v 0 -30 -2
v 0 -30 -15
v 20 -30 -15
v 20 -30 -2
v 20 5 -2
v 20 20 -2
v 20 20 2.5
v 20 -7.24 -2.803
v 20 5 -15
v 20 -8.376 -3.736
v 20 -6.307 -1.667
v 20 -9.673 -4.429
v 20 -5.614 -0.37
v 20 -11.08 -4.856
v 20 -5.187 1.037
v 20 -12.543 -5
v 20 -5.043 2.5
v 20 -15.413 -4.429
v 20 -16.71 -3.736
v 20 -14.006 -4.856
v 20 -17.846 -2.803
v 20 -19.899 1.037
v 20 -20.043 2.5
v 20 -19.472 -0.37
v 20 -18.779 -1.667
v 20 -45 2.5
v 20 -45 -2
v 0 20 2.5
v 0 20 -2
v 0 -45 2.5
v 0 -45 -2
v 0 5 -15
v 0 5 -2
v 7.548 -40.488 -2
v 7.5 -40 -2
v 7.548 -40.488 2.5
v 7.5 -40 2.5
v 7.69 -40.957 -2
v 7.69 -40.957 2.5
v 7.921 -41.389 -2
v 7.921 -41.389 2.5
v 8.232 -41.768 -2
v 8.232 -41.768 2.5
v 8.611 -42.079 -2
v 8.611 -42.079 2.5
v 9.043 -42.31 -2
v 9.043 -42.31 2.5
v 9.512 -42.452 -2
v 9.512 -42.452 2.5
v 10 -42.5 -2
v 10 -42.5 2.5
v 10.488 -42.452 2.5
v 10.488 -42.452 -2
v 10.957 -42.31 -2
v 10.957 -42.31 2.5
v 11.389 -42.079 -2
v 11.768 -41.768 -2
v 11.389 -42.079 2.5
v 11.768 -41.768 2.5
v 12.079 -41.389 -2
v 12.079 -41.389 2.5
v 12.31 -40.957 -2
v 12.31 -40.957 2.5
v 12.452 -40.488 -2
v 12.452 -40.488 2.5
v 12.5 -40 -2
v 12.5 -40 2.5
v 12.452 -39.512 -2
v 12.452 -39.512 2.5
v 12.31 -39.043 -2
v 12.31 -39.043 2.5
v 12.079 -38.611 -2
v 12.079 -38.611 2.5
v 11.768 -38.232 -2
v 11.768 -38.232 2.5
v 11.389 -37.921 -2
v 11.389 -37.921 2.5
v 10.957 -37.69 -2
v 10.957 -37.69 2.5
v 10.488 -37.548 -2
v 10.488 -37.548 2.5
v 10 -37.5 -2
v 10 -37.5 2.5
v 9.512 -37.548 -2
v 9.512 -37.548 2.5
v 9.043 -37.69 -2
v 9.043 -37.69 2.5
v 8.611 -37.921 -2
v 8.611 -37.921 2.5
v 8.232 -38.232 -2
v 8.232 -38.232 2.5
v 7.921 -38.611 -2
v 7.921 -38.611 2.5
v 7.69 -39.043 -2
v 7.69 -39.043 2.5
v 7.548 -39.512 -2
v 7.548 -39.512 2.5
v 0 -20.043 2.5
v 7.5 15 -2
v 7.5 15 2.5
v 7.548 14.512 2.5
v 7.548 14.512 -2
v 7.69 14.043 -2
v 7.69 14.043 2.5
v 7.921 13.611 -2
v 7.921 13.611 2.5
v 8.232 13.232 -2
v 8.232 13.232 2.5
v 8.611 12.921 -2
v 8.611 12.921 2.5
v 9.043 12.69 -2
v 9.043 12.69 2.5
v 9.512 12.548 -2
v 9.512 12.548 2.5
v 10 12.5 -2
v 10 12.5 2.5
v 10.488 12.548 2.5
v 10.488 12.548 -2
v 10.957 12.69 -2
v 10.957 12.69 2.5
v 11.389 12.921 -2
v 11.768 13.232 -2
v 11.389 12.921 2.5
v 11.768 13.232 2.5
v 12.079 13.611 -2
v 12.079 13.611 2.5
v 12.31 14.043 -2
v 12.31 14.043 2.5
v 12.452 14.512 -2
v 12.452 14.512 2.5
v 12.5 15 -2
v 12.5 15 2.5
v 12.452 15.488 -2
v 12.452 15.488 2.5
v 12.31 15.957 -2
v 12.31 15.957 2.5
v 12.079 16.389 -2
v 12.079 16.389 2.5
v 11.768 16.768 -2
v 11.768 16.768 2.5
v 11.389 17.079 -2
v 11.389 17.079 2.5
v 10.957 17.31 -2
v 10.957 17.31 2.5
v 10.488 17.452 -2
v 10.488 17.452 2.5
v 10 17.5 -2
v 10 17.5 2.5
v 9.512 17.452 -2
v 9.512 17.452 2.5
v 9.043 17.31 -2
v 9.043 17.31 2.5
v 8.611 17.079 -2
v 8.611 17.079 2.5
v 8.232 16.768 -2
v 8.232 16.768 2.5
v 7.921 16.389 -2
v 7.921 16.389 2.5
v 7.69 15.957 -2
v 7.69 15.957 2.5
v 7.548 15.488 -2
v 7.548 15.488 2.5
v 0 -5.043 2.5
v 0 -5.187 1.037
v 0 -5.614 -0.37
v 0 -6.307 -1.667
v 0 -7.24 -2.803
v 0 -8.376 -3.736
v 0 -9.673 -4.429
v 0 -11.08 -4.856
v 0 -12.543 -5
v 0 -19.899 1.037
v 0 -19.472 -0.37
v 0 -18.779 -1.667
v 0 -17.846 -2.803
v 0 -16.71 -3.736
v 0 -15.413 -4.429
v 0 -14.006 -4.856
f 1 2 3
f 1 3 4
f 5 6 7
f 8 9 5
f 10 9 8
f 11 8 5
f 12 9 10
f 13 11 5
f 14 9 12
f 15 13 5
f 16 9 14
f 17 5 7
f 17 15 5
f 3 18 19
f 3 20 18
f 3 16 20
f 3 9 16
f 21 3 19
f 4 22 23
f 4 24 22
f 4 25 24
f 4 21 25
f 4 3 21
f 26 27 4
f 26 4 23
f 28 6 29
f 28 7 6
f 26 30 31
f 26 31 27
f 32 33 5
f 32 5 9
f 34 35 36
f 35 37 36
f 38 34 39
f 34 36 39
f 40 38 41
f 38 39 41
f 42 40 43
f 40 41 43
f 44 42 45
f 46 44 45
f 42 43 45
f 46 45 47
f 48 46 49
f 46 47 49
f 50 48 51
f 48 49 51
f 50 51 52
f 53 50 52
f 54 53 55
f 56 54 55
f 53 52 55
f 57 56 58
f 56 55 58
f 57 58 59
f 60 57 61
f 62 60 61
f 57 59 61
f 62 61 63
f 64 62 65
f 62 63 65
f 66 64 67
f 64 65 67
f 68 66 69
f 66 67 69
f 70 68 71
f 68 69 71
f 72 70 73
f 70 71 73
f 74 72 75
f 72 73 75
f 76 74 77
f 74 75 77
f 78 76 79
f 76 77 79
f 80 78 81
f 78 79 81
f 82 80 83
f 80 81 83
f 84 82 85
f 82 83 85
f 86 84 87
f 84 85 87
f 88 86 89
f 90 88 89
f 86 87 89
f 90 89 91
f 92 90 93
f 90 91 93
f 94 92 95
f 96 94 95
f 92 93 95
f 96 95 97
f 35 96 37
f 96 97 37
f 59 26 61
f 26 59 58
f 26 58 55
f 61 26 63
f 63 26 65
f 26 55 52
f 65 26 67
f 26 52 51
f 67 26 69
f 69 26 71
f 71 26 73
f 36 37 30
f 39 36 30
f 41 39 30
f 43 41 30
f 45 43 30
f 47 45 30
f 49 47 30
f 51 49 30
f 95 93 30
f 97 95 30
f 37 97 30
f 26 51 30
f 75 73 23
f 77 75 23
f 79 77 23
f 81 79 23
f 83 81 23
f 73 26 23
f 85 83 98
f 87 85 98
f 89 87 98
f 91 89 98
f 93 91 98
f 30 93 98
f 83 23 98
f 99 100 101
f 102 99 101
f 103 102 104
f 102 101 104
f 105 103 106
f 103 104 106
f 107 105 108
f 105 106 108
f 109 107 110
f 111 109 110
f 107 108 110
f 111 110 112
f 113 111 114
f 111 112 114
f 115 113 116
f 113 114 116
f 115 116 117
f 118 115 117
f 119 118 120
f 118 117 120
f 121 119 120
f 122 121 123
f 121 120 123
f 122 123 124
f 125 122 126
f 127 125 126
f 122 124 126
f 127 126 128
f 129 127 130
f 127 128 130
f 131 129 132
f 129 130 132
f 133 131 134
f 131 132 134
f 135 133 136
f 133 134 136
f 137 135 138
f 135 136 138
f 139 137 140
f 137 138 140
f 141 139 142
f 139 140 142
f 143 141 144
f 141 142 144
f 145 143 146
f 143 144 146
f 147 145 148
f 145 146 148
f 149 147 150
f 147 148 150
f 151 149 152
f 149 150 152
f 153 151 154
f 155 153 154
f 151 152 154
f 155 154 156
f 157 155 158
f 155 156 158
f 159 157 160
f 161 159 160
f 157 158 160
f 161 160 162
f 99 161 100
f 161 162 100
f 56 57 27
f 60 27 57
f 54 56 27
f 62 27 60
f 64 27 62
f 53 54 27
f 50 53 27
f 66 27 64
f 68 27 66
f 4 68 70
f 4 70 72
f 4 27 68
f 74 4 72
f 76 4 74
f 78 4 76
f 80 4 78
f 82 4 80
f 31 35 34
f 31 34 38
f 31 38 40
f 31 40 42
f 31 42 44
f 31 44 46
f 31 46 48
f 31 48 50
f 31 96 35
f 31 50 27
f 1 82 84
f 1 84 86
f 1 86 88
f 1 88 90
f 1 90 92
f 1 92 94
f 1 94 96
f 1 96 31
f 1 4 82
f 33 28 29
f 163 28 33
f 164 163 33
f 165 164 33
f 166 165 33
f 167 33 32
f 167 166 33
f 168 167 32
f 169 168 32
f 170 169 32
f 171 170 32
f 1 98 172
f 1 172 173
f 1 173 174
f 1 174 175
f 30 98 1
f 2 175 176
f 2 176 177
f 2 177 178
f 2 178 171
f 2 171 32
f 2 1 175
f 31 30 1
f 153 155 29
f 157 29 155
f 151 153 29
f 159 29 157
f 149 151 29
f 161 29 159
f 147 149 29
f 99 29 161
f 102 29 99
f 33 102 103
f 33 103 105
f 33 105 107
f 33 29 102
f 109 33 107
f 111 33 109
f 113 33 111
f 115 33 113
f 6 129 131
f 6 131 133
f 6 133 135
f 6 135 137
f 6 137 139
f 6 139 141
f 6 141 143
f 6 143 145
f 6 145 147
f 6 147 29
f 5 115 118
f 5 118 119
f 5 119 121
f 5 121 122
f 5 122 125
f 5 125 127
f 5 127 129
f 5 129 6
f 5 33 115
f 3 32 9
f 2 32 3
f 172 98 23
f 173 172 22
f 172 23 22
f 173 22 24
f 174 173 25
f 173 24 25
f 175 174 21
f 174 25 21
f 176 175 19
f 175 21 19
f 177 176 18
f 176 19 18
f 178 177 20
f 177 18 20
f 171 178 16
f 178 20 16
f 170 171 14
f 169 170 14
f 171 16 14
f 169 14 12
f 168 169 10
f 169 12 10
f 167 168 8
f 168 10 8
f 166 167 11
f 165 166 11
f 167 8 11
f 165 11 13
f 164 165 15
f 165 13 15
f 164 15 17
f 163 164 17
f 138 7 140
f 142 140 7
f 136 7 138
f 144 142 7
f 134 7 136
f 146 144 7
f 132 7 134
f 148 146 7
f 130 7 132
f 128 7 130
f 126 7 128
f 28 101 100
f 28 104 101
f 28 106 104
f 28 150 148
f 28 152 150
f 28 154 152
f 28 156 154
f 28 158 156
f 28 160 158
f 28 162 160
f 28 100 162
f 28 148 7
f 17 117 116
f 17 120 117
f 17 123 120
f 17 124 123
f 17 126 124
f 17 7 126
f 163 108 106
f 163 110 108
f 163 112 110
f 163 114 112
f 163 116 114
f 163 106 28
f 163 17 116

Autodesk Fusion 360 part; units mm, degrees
sketch "Boceto1" plane through (0, 0, 0) normal (1, 0, 0) x (0, 1, 0)
  line L0 (-30, 20) -> (5, 20)
  line L1 (5, 20) -> (5, -15)
  line L2 (5, -15) -> (-30, -15)
  line L3 (-30, -15) -> (-30, 20)
extrude "Extruir1" add sketch "Boceto1" along normal blind 20
sketch "Boceto2" plane through (20, 0, 0) normal (1, 0, 0) x (0, 1, 0)
  line L0 (-30, -15) -> (5, -15)
  line L1 (5, -15) -> (5, 20)
  line L2 (5, 20) -> (-30, 20)
  line L3 (-30, 20) -> (-30, -15)
  circle A0 centre (-12.543, 2.5) radius 7.5
  dimension "d3" = 15
extrude "Extruir2" cut sketch "Boceto2" against normal blind 20 contours A0
sketch "Boceto3" plane through (20, 0, 0) normal (1, 0, 0) x (0, 1, 0)
  circle A0 centre (-12.543, 2.5) radius 7.5
  line L0 (-30, -15) -> (5, -15)
  line L1 (5, -15) -> (5, 20)
  line L2 (5, 20) -> (-30, 20)
  line L3 (-30, 20) -> (-30, -15)
  line L4 (-30, 2.5) -> (5, 2.5)
  line L5 (5, 2.5) -> (5, 20)
  line L6 (5, 20) -> (-30, 20)
  line L7 (-30, 20) -> (-30, 2.5)
extrude "Extruir3" cut sketch "Boceto3" against normal blind 20 contours A0 L1 L2 L3 L4 L5 L6 L7
sketch "Boceto4" plane through (0, -30, 0) normal (0, -1, 0) x (1, 0, 0)
  line L0 (20, 2.5) -> (0, 2.5)
  line L1 (0, 2.5) -> (0, -15)
  line L2 (0, -15) -> (20, -15)
  line L3 (20, -15) -> (20, 2.5)
  line L4 (0, 2.5) -> (20, 2.5)
  line L5 (20, 2.5) -> (20, -2)
  line L6 (20, -2) -> (0, -2)
  line L7 (0, -2) -> (0, 2.5)
extrude "Extruir4" add sketch "Boceto4" along normal blind 15 contours L0 L1 L3 L4 L5 L6 L7
sketch "Boceto5" plane through (0, 5, 0) normal (0, 1, 0) x (-1, 0, 0)
  line L0 (0, 2.5) -> (-20, 2.5)
  line L1 (-20, 2.5) -> (-20, -15)
  line L2 (-20, -15) -> (0, -15)
  line L3 (0, -15) -> (0, 2.5)
sketch "Boceto6" plane through (0, 5, 0) normal (0, 1, 0) x (-1, 0, 0)
  line L0 (-20, 2.5) -> (0, 2.5)
  line L1 (0, 2.5) -> (0, -2)
  line L2 (0, -2) -> (-20, -2)
  line L3 (-20, -2) -> (-20, 2.5)
extrude "Extruir5" add sketch "Boceto6" along normal blind 15
sketch "Boceto7" plane through (0, 0, 2.5) normal (0, 0, 1) x (-1, 0, 0)
  line L0 (-20, 45) -> (-20, 20.043)
  line L1 (-20, 20.043) -> (0, 20.043)
  line L2 (0, 20.043) -> (0, 45)
  line L3 (0, 45) -> (-20, 45)
  circle A0 centre (-10, 40) radius 2.5
  circle A1 centre (-10, -15) radius 2.5
  dimension "d12" = 5
  dimension "d13" = 5
extrude "Extruir6" cut sketch "Boceto7" against normal blind 4.5 contours A0 | A1
